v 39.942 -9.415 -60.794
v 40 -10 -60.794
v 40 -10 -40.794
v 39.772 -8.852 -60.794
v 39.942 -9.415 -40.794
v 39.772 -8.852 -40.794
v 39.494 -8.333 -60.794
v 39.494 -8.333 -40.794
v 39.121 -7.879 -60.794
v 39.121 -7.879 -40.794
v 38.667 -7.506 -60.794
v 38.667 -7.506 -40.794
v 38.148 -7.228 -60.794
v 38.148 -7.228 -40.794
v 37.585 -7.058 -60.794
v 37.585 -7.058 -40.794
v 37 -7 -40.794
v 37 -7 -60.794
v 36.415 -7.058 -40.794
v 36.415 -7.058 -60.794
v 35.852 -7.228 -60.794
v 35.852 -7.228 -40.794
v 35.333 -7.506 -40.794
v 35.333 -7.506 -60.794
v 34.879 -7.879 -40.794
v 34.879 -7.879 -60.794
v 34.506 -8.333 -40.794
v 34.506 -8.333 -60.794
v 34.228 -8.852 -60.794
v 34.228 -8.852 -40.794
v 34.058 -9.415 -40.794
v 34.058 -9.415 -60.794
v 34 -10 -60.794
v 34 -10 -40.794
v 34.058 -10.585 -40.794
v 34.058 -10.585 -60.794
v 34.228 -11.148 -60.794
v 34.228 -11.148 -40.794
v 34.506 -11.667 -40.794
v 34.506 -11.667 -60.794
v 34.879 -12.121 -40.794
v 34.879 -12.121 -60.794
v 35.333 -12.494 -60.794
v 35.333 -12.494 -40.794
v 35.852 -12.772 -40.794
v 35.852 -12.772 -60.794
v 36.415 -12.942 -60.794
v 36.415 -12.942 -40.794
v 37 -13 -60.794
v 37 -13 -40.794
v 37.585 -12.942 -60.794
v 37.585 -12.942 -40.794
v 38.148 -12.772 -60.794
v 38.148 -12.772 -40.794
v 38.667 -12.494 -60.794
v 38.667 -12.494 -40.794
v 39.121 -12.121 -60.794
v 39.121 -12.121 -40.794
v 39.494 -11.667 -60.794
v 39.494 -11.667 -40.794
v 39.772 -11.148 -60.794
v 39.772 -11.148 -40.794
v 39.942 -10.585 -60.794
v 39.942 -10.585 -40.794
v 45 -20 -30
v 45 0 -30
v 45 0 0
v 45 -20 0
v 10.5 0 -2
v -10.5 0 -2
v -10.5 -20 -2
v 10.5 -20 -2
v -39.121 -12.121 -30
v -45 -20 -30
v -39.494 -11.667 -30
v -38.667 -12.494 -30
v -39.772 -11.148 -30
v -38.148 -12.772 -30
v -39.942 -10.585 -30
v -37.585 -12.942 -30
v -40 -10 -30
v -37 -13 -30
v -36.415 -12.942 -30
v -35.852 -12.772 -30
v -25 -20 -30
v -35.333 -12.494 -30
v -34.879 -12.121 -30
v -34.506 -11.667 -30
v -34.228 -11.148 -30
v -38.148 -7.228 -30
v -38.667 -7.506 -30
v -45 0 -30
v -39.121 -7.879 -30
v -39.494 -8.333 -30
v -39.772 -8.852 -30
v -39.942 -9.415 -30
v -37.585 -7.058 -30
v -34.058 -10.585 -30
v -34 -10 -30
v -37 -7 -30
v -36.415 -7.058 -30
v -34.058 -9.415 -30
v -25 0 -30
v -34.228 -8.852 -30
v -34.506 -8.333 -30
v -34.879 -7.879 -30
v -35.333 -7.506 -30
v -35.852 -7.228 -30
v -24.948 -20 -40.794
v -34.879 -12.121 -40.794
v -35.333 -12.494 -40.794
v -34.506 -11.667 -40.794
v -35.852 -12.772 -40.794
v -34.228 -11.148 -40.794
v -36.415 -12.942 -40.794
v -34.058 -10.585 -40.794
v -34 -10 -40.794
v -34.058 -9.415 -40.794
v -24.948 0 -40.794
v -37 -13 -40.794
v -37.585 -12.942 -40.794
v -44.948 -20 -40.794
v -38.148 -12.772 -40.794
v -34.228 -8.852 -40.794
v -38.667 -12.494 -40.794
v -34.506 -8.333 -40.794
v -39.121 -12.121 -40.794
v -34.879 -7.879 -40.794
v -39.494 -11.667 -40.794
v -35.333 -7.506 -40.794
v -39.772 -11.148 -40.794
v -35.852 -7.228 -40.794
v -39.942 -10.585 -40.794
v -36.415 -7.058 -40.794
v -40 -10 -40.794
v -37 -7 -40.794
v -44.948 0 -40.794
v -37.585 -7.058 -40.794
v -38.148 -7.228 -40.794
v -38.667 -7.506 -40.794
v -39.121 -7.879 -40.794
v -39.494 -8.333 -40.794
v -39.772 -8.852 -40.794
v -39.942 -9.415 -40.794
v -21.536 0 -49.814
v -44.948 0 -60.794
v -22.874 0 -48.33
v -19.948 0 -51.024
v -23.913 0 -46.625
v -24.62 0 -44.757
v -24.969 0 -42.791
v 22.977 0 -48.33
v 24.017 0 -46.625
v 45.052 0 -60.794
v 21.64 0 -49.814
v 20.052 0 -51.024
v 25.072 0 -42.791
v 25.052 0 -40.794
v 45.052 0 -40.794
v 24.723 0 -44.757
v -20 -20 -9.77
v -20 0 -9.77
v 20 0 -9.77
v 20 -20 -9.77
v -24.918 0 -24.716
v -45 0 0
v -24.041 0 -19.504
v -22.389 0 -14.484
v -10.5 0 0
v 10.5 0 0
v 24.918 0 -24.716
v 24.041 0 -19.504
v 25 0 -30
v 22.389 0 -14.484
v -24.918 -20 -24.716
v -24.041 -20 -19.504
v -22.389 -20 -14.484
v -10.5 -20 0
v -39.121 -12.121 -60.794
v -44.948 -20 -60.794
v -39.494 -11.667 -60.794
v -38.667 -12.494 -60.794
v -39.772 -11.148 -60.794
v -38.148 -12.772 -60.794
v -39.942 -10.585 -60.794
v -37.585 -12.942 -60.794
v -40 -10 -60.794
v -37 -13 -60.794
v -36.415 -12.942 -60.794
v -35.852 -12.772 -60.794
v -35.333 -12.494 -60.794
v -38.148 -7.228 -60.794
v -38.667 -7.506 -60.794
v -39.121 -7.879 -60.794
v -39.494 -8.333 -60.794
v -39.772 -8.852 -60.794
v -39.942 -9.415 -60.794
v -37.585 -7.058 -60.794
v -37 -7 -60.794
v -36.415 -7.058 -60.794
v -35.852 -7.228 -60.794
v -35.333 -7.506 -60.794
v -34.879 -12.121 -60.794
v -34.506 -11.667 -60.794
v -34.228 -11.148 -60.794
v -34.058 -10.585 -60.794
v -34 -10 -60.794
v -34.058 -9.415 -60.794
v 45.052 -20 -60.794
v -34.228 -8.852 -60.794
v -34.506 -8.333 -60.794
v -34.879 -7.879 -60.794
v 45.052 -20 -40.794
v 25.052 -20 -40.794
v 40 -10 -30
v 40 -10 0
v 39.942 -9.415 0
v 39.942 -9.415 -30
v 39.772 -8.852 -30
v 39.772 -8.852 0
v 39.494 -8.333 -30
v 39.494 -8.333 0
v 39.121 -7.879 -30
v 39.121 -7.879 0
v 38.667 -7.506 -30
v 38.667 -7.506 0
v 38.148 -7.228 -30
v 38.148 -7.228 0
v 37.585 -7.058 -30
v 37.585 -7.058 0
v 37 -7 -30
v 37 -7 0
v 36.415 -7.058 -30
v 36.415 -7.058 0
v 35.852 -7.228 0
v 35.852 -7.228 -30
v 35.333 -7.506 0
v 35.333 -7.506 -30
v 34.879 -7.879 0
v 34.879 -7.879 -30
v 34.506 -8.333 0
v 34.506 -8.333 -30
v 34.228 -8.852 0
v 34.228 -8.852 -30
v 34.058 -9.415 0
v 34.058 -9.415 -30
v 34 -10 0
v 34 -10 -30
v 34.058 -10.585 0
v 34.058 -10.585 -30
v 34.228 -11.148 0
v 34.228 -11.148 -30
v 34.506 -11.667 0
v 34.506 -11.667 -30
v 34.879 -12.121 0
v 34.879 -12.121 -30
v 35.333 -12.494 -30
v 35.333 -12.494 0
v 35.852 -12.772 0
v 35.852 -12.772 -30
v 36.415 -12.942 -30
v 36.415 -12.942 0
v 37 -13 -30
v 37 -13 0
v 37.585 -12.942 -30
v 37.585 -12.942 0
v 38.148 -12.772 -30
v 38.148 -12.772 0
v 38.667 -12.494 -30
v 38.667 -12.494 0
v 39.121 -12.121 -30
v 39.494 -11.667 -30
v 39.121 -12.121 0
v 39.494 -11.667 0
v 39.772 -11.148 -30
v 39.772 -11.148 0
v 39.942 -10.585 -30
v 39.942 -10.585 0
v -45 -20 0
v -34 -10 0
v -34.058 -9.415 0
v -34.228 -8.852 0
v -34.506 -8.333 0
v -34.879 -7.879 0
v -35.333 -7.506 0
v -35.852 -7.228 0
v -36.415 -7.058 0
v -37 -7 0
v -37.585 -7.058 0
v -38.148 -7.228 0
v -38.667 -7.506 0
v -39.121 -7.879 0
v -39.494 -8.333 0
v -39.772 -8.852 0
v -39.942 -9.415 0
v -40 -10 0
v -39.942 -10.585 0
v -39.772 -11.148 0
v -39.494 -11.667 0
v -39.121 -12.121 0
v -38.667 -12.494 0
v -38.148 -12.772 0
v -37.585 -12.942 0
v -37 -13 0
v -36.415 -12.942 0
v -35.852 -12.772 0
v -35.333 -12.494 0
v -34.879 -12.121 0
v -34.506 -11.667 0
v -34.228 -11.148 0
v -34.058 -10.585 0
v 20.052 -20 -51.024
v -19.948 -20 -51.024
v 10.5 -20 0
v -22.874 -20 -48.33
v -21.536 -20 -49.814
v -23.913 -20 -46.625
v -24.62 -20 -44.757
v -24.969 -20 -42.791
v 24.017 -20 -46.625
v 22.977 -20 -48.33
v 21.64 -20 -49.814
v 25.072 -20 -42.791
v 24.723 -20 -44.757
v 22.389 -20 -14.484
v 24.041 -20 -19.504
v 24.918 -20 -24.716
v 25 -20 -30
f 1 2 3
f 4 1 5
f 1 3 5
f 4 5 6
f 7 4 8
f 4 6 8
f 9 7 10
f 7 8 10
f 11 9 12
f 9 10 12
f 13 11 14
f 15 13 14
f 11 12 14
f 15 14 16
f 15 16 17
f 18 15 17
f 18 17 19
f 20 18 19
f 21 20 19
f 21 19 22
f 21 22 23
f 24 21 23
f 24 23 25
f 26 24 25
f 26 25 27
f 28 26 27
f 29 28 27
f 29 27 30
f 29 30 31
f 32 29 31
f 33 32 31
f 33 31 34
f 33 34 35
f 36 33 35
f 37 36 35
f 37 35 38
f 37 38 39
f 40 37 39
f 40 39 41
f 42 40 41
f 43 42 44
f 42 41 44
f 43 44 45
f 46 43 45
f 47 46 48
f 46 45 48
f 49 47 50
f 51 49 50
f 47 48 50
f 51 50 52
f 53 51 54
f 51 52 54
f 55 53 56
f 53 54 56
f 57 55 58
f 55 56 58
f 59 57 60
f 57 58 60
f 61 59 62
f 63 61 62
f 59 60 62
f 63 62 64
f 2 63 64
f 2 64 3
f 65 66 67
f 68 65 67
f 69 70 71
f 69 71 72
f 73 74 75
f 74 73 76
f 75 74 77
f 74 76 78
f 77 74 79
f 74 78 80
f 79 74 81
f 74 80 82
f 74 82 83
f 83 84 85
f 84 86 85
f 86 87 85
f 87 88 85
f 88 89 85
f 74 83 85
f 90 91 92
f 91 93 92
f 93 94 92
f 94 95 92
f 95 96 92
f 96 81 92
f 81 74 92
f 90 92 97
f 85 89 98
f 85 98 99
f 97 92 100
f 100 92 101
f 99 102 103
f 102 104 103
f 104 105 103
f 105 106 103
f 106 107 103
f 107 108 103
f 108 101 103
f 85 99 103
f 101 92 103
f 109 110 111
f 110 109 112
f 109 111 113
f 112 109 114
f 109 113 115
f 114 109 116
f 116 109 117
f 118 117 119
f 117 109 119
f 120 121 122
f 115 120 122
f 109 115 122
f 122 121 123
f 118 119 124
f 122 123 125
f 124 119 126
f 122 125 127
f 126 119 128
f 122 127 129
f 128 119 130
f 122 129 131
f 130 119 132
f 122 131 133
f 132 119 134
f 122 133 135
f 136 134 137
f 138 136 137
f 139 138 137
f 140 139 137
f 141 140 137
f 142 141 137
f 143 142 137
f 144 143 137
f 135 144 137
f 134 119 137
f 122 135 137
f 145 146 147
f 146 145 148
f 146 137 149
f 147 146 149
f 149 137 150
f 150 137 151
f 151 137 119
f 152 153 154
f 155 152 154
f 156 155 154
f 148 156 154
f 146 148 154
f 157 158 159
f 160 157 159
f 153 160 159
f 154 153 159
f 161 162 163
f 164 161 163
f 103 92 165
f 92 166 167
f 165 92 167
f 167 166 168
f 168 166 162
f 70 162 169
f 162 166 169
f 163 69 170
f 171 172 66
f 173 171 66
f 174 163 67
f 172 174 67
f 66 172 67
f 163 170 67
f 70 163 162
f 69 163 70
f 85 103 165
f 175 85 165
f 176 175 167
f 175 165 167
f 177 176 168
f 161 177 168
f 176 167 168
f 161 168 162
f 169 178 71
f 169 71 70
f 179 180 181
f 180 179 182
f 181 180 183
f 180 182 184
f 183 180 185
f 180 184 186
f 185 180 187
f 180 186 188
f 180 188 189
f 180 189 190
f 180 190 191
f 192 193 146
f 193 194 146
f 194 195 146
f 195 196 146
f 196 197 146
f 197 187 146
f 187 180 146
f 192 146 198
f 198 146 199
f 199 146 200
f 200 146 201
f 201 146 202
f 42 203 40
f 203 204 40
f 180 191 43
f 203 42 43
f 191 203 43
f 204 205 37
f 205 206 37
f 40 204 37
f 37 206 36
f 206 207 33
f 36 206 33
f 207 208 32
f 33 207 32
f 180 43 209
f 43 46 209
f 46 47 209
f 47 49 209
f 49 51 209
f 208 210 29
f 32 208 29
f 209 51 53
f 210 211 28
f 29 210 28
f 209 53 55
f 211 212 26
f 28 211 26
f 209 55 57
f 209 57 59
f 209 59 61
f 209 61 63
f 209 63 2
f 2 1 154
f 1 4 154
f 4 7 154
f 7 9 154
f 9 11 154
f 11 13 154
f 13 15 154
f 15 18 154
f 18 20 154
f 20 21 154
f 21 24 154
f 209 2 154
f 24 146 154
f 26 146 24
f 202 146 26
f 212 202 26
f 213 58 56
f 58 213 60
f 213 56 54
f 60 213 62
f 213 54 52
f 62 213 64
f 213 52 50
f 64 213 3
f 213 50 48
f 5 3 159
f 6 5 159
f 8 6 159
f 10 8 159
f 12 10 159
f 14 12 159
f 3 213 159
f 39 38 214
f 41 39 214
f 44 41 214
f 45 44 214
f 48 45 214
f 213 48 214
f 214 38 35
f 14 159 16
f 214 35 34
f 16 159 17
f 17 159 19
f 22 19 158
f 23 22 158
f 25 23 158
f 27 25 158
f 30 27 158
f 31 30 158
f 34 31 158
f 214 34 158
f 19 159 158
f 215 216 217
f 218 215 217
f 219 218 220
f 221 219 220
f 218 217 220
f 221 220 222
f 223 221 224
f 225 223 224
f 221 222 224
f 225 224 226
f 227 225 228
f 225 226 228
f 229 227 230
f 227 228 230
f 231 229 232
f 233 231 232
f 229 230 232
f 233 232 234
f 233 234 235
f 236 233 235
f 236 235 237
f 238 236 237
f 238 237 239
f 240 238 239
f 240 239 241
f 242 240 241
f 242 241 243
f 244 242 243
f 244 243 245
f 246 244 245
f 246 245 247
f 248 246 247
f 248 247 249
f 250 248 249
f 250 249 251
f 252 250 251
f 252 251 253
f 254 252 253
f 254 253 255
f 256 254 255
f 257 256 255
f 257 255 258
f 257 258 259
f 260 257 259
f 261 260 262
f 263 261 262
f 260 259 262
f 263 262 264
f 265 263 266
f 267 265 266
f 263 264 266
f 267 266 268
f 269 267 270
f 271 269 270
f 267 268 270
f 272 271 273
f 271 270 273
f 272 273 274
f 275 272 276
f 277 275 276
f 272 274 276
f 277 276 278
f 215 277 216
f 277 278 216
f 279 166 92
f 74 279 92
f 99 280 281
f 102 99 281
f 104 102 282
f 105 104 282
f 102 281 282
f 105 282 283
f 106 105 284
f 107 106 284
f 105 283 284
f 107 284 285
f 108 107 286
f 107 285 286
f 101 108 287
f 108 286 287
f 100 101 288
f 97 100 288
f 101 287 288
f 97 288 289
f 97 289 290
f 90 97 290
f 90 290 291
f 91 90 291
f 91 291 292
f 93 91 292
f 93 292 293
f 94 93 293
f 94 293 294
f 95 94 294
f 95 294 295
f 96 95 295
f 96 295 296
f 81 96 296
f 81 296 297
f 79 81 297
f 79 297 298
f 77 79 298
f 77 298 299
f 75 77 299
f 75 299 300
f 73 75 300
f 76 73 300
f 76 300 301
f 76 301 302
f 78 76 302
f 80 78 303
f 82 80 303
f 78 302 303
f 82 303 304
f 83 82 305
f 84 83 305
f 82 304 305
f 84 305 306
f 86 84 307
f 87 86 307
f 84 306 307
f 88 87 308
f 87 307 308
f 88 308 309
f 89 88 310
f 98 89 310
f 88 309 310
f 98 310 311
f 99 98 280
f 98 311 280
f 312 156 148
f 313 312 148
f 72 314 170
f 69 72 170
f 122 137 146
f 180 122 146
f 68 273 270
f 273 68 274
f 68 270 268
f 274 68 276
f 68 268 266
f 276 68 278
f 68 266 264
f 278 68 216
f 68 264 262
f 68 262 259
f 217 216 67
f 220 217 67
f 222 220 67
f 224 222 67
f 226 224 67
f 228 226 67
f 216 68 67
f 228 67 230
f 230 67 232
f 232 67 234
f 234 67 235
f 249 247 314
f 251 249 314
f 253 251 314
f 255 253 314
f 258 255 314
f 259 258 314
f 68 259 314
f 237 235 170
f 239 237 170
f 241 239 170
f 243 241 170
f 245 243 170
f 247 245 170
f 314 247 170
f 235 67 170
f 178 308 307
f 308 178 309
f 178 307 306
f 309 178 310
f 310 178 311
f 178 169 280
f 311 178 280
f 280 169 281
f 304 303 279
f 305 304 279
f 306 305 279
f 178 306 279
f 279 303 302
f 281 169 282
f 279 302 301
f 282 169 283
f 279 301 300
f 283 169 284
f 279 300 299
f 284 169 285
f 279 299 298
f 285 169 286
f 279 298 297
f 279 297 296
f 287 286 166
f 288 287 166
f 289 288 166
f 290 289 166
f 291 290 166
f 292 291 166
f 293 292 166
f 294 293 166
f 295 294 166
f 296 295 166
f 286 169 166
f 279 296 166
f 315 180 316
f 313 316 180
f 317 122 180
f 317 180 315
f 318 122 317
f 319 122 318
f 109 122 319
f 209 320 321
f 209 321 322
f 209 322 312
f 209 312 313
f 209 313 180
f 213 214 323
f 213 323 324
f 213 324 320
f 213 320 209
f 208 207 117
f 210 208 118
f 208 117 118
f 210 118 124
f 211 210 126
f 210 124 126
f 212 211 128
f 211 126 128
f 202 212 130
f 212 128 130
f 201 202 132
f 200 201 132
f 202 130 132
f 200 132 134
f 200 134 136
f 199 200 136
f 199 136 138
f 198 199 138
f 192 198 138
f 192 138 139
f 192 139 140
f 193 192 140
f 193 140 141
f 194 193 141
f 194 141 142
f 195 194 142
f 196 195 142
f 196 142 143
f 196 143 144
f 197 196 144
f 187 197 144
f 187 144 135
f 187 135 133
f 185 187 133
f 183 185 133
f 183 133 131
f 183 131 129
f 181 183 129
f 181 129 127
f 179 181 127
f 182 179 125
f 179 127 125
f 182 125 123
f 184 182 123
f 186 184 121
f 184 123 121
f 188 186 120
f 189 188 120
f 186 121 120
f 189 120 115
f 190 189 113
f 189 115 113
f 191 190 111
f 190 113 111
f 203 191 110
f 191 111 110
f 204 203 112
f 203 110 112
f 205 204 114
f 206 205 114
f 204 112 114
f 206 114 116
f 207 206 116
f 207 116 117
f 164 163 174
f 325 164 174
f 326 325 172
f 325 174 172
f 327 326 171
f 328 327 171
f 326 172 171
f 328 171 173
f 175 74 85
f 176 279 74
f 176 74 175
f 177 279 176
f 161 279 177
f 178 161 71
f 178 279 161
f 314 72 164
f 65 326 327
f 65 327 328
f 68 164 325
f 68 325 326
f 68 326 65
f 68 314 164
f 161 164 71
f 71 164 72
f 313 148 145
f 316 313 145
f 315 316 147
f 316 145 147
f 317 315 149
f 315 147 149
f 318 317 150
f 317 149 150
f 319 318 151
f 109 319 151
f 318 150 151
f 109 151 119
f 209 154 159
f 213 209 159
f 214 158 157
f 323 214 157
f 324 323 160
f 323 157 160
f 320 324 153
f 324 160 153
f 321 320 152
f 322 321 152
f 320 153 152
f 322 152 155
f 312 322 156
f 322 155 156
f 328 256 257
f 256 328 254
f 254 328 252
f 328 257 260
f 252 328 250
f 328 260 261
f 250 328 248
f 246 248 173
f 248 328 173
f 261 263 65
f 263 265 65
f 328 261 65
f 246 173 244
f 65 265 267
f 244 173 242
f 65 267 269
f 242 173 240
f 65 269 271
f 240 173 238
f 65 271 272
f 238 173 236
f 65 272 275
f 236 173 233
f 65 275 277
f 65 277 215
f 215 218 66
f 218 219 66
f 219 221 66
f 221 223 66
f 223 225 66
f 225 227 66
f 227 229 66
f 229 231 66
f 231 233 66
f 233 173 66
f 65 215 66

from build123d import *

# Parameters (mm, degrees)
F1_DEPTH = 20
F3_DEPTH = 20
F4_R     = 3
F5_DEPTH = 150
F6_W     = 21
F6_H     = 30
F7_DEPTH = 2


with BuildPart() as f1:
    # F0 (on Front) → F1 (new body)
    with BuildSketch(Plane.XZ):
        with BuildLine():
            Line((45, 0), (-45, 0))
            Line((-45, 0), (-45, -30))
            Line((-45, -30), (-25, -30))
            ThreePointArc((-25, -30), (-24.040537, -19.504195), (-20, -9.769898))
            Line((-20, -9.769898), (20, -9.769898))
            ThreePointArc((20, -9.769898), (24.040537, -19.504195), (25, -30))
            Line((25, -30), (45, -30))
            Line((45, -30), (45, 0))
        make_face()
    extrude(amount=F1_DEPTH)


with BuildPart() as f3:
    # F2 (on Front) → F3 (new body)
    with BuildSketch(Plane.XZ):
        with BuildLine():
            Line((-44.948185, -60.794169), (45.051815, -60.794169))
            Line((45.051815, -60.794169), (45.051815, -40.794169))
            Line((45.051815, -40.794169), (25.051815, -40.794169))
            ThreePointArc((25.051815, -40.794169), (24.016941, -46.625337), (20.051876, -51.024397))
            Line((20.051876, -51.024397), (-19.948124, -51.024397))
            ThreePointArc((-19.948124, -51.024397), (-23.913259, -46.625358), (-24.948185, -40.794169))
            Line((-24.948185, -40.794169), (-44.948185, -40.794169))
            Line((-44.948185, -40.794169), (-44.948185, -60.794169))
        make_face()
    extrude(amount=F3_DEPTH)


with BuildPart() as f5_tool:
    # F4 (on Top) → F5 (new body)
    with BuildSketch(Plane.XY):
        with Locations((-37, -10)):
            Circle(F4_R)
        with Locations((37, -10)):
            Circle(F4_R)
    extrude(amount=-F5_DEPTH)


with BuildPart() as f1_1:
    add(f1.part)

    # F5: cut by f5_tool
    add(f5_tool.part, mode=Mode.SUBTRACT)

    # F6 (on Top) → F7 (cut)
    with BuildSketch(Plane.XY):
        with Locations((0, -9.132032)):
            Rectangle(F6_W, F6_H)
    extrude(amount=-F7_DEPTH, mode=Mode.SUBTRACT)


with BuildPart() as f3_1:
    add(f3.part)

    # F5: cut by f5_tool
    add(f5_tool.part, mode=Mode.SUBTRACT)


solid = Compound([f1_1.part, f3_1.part])
